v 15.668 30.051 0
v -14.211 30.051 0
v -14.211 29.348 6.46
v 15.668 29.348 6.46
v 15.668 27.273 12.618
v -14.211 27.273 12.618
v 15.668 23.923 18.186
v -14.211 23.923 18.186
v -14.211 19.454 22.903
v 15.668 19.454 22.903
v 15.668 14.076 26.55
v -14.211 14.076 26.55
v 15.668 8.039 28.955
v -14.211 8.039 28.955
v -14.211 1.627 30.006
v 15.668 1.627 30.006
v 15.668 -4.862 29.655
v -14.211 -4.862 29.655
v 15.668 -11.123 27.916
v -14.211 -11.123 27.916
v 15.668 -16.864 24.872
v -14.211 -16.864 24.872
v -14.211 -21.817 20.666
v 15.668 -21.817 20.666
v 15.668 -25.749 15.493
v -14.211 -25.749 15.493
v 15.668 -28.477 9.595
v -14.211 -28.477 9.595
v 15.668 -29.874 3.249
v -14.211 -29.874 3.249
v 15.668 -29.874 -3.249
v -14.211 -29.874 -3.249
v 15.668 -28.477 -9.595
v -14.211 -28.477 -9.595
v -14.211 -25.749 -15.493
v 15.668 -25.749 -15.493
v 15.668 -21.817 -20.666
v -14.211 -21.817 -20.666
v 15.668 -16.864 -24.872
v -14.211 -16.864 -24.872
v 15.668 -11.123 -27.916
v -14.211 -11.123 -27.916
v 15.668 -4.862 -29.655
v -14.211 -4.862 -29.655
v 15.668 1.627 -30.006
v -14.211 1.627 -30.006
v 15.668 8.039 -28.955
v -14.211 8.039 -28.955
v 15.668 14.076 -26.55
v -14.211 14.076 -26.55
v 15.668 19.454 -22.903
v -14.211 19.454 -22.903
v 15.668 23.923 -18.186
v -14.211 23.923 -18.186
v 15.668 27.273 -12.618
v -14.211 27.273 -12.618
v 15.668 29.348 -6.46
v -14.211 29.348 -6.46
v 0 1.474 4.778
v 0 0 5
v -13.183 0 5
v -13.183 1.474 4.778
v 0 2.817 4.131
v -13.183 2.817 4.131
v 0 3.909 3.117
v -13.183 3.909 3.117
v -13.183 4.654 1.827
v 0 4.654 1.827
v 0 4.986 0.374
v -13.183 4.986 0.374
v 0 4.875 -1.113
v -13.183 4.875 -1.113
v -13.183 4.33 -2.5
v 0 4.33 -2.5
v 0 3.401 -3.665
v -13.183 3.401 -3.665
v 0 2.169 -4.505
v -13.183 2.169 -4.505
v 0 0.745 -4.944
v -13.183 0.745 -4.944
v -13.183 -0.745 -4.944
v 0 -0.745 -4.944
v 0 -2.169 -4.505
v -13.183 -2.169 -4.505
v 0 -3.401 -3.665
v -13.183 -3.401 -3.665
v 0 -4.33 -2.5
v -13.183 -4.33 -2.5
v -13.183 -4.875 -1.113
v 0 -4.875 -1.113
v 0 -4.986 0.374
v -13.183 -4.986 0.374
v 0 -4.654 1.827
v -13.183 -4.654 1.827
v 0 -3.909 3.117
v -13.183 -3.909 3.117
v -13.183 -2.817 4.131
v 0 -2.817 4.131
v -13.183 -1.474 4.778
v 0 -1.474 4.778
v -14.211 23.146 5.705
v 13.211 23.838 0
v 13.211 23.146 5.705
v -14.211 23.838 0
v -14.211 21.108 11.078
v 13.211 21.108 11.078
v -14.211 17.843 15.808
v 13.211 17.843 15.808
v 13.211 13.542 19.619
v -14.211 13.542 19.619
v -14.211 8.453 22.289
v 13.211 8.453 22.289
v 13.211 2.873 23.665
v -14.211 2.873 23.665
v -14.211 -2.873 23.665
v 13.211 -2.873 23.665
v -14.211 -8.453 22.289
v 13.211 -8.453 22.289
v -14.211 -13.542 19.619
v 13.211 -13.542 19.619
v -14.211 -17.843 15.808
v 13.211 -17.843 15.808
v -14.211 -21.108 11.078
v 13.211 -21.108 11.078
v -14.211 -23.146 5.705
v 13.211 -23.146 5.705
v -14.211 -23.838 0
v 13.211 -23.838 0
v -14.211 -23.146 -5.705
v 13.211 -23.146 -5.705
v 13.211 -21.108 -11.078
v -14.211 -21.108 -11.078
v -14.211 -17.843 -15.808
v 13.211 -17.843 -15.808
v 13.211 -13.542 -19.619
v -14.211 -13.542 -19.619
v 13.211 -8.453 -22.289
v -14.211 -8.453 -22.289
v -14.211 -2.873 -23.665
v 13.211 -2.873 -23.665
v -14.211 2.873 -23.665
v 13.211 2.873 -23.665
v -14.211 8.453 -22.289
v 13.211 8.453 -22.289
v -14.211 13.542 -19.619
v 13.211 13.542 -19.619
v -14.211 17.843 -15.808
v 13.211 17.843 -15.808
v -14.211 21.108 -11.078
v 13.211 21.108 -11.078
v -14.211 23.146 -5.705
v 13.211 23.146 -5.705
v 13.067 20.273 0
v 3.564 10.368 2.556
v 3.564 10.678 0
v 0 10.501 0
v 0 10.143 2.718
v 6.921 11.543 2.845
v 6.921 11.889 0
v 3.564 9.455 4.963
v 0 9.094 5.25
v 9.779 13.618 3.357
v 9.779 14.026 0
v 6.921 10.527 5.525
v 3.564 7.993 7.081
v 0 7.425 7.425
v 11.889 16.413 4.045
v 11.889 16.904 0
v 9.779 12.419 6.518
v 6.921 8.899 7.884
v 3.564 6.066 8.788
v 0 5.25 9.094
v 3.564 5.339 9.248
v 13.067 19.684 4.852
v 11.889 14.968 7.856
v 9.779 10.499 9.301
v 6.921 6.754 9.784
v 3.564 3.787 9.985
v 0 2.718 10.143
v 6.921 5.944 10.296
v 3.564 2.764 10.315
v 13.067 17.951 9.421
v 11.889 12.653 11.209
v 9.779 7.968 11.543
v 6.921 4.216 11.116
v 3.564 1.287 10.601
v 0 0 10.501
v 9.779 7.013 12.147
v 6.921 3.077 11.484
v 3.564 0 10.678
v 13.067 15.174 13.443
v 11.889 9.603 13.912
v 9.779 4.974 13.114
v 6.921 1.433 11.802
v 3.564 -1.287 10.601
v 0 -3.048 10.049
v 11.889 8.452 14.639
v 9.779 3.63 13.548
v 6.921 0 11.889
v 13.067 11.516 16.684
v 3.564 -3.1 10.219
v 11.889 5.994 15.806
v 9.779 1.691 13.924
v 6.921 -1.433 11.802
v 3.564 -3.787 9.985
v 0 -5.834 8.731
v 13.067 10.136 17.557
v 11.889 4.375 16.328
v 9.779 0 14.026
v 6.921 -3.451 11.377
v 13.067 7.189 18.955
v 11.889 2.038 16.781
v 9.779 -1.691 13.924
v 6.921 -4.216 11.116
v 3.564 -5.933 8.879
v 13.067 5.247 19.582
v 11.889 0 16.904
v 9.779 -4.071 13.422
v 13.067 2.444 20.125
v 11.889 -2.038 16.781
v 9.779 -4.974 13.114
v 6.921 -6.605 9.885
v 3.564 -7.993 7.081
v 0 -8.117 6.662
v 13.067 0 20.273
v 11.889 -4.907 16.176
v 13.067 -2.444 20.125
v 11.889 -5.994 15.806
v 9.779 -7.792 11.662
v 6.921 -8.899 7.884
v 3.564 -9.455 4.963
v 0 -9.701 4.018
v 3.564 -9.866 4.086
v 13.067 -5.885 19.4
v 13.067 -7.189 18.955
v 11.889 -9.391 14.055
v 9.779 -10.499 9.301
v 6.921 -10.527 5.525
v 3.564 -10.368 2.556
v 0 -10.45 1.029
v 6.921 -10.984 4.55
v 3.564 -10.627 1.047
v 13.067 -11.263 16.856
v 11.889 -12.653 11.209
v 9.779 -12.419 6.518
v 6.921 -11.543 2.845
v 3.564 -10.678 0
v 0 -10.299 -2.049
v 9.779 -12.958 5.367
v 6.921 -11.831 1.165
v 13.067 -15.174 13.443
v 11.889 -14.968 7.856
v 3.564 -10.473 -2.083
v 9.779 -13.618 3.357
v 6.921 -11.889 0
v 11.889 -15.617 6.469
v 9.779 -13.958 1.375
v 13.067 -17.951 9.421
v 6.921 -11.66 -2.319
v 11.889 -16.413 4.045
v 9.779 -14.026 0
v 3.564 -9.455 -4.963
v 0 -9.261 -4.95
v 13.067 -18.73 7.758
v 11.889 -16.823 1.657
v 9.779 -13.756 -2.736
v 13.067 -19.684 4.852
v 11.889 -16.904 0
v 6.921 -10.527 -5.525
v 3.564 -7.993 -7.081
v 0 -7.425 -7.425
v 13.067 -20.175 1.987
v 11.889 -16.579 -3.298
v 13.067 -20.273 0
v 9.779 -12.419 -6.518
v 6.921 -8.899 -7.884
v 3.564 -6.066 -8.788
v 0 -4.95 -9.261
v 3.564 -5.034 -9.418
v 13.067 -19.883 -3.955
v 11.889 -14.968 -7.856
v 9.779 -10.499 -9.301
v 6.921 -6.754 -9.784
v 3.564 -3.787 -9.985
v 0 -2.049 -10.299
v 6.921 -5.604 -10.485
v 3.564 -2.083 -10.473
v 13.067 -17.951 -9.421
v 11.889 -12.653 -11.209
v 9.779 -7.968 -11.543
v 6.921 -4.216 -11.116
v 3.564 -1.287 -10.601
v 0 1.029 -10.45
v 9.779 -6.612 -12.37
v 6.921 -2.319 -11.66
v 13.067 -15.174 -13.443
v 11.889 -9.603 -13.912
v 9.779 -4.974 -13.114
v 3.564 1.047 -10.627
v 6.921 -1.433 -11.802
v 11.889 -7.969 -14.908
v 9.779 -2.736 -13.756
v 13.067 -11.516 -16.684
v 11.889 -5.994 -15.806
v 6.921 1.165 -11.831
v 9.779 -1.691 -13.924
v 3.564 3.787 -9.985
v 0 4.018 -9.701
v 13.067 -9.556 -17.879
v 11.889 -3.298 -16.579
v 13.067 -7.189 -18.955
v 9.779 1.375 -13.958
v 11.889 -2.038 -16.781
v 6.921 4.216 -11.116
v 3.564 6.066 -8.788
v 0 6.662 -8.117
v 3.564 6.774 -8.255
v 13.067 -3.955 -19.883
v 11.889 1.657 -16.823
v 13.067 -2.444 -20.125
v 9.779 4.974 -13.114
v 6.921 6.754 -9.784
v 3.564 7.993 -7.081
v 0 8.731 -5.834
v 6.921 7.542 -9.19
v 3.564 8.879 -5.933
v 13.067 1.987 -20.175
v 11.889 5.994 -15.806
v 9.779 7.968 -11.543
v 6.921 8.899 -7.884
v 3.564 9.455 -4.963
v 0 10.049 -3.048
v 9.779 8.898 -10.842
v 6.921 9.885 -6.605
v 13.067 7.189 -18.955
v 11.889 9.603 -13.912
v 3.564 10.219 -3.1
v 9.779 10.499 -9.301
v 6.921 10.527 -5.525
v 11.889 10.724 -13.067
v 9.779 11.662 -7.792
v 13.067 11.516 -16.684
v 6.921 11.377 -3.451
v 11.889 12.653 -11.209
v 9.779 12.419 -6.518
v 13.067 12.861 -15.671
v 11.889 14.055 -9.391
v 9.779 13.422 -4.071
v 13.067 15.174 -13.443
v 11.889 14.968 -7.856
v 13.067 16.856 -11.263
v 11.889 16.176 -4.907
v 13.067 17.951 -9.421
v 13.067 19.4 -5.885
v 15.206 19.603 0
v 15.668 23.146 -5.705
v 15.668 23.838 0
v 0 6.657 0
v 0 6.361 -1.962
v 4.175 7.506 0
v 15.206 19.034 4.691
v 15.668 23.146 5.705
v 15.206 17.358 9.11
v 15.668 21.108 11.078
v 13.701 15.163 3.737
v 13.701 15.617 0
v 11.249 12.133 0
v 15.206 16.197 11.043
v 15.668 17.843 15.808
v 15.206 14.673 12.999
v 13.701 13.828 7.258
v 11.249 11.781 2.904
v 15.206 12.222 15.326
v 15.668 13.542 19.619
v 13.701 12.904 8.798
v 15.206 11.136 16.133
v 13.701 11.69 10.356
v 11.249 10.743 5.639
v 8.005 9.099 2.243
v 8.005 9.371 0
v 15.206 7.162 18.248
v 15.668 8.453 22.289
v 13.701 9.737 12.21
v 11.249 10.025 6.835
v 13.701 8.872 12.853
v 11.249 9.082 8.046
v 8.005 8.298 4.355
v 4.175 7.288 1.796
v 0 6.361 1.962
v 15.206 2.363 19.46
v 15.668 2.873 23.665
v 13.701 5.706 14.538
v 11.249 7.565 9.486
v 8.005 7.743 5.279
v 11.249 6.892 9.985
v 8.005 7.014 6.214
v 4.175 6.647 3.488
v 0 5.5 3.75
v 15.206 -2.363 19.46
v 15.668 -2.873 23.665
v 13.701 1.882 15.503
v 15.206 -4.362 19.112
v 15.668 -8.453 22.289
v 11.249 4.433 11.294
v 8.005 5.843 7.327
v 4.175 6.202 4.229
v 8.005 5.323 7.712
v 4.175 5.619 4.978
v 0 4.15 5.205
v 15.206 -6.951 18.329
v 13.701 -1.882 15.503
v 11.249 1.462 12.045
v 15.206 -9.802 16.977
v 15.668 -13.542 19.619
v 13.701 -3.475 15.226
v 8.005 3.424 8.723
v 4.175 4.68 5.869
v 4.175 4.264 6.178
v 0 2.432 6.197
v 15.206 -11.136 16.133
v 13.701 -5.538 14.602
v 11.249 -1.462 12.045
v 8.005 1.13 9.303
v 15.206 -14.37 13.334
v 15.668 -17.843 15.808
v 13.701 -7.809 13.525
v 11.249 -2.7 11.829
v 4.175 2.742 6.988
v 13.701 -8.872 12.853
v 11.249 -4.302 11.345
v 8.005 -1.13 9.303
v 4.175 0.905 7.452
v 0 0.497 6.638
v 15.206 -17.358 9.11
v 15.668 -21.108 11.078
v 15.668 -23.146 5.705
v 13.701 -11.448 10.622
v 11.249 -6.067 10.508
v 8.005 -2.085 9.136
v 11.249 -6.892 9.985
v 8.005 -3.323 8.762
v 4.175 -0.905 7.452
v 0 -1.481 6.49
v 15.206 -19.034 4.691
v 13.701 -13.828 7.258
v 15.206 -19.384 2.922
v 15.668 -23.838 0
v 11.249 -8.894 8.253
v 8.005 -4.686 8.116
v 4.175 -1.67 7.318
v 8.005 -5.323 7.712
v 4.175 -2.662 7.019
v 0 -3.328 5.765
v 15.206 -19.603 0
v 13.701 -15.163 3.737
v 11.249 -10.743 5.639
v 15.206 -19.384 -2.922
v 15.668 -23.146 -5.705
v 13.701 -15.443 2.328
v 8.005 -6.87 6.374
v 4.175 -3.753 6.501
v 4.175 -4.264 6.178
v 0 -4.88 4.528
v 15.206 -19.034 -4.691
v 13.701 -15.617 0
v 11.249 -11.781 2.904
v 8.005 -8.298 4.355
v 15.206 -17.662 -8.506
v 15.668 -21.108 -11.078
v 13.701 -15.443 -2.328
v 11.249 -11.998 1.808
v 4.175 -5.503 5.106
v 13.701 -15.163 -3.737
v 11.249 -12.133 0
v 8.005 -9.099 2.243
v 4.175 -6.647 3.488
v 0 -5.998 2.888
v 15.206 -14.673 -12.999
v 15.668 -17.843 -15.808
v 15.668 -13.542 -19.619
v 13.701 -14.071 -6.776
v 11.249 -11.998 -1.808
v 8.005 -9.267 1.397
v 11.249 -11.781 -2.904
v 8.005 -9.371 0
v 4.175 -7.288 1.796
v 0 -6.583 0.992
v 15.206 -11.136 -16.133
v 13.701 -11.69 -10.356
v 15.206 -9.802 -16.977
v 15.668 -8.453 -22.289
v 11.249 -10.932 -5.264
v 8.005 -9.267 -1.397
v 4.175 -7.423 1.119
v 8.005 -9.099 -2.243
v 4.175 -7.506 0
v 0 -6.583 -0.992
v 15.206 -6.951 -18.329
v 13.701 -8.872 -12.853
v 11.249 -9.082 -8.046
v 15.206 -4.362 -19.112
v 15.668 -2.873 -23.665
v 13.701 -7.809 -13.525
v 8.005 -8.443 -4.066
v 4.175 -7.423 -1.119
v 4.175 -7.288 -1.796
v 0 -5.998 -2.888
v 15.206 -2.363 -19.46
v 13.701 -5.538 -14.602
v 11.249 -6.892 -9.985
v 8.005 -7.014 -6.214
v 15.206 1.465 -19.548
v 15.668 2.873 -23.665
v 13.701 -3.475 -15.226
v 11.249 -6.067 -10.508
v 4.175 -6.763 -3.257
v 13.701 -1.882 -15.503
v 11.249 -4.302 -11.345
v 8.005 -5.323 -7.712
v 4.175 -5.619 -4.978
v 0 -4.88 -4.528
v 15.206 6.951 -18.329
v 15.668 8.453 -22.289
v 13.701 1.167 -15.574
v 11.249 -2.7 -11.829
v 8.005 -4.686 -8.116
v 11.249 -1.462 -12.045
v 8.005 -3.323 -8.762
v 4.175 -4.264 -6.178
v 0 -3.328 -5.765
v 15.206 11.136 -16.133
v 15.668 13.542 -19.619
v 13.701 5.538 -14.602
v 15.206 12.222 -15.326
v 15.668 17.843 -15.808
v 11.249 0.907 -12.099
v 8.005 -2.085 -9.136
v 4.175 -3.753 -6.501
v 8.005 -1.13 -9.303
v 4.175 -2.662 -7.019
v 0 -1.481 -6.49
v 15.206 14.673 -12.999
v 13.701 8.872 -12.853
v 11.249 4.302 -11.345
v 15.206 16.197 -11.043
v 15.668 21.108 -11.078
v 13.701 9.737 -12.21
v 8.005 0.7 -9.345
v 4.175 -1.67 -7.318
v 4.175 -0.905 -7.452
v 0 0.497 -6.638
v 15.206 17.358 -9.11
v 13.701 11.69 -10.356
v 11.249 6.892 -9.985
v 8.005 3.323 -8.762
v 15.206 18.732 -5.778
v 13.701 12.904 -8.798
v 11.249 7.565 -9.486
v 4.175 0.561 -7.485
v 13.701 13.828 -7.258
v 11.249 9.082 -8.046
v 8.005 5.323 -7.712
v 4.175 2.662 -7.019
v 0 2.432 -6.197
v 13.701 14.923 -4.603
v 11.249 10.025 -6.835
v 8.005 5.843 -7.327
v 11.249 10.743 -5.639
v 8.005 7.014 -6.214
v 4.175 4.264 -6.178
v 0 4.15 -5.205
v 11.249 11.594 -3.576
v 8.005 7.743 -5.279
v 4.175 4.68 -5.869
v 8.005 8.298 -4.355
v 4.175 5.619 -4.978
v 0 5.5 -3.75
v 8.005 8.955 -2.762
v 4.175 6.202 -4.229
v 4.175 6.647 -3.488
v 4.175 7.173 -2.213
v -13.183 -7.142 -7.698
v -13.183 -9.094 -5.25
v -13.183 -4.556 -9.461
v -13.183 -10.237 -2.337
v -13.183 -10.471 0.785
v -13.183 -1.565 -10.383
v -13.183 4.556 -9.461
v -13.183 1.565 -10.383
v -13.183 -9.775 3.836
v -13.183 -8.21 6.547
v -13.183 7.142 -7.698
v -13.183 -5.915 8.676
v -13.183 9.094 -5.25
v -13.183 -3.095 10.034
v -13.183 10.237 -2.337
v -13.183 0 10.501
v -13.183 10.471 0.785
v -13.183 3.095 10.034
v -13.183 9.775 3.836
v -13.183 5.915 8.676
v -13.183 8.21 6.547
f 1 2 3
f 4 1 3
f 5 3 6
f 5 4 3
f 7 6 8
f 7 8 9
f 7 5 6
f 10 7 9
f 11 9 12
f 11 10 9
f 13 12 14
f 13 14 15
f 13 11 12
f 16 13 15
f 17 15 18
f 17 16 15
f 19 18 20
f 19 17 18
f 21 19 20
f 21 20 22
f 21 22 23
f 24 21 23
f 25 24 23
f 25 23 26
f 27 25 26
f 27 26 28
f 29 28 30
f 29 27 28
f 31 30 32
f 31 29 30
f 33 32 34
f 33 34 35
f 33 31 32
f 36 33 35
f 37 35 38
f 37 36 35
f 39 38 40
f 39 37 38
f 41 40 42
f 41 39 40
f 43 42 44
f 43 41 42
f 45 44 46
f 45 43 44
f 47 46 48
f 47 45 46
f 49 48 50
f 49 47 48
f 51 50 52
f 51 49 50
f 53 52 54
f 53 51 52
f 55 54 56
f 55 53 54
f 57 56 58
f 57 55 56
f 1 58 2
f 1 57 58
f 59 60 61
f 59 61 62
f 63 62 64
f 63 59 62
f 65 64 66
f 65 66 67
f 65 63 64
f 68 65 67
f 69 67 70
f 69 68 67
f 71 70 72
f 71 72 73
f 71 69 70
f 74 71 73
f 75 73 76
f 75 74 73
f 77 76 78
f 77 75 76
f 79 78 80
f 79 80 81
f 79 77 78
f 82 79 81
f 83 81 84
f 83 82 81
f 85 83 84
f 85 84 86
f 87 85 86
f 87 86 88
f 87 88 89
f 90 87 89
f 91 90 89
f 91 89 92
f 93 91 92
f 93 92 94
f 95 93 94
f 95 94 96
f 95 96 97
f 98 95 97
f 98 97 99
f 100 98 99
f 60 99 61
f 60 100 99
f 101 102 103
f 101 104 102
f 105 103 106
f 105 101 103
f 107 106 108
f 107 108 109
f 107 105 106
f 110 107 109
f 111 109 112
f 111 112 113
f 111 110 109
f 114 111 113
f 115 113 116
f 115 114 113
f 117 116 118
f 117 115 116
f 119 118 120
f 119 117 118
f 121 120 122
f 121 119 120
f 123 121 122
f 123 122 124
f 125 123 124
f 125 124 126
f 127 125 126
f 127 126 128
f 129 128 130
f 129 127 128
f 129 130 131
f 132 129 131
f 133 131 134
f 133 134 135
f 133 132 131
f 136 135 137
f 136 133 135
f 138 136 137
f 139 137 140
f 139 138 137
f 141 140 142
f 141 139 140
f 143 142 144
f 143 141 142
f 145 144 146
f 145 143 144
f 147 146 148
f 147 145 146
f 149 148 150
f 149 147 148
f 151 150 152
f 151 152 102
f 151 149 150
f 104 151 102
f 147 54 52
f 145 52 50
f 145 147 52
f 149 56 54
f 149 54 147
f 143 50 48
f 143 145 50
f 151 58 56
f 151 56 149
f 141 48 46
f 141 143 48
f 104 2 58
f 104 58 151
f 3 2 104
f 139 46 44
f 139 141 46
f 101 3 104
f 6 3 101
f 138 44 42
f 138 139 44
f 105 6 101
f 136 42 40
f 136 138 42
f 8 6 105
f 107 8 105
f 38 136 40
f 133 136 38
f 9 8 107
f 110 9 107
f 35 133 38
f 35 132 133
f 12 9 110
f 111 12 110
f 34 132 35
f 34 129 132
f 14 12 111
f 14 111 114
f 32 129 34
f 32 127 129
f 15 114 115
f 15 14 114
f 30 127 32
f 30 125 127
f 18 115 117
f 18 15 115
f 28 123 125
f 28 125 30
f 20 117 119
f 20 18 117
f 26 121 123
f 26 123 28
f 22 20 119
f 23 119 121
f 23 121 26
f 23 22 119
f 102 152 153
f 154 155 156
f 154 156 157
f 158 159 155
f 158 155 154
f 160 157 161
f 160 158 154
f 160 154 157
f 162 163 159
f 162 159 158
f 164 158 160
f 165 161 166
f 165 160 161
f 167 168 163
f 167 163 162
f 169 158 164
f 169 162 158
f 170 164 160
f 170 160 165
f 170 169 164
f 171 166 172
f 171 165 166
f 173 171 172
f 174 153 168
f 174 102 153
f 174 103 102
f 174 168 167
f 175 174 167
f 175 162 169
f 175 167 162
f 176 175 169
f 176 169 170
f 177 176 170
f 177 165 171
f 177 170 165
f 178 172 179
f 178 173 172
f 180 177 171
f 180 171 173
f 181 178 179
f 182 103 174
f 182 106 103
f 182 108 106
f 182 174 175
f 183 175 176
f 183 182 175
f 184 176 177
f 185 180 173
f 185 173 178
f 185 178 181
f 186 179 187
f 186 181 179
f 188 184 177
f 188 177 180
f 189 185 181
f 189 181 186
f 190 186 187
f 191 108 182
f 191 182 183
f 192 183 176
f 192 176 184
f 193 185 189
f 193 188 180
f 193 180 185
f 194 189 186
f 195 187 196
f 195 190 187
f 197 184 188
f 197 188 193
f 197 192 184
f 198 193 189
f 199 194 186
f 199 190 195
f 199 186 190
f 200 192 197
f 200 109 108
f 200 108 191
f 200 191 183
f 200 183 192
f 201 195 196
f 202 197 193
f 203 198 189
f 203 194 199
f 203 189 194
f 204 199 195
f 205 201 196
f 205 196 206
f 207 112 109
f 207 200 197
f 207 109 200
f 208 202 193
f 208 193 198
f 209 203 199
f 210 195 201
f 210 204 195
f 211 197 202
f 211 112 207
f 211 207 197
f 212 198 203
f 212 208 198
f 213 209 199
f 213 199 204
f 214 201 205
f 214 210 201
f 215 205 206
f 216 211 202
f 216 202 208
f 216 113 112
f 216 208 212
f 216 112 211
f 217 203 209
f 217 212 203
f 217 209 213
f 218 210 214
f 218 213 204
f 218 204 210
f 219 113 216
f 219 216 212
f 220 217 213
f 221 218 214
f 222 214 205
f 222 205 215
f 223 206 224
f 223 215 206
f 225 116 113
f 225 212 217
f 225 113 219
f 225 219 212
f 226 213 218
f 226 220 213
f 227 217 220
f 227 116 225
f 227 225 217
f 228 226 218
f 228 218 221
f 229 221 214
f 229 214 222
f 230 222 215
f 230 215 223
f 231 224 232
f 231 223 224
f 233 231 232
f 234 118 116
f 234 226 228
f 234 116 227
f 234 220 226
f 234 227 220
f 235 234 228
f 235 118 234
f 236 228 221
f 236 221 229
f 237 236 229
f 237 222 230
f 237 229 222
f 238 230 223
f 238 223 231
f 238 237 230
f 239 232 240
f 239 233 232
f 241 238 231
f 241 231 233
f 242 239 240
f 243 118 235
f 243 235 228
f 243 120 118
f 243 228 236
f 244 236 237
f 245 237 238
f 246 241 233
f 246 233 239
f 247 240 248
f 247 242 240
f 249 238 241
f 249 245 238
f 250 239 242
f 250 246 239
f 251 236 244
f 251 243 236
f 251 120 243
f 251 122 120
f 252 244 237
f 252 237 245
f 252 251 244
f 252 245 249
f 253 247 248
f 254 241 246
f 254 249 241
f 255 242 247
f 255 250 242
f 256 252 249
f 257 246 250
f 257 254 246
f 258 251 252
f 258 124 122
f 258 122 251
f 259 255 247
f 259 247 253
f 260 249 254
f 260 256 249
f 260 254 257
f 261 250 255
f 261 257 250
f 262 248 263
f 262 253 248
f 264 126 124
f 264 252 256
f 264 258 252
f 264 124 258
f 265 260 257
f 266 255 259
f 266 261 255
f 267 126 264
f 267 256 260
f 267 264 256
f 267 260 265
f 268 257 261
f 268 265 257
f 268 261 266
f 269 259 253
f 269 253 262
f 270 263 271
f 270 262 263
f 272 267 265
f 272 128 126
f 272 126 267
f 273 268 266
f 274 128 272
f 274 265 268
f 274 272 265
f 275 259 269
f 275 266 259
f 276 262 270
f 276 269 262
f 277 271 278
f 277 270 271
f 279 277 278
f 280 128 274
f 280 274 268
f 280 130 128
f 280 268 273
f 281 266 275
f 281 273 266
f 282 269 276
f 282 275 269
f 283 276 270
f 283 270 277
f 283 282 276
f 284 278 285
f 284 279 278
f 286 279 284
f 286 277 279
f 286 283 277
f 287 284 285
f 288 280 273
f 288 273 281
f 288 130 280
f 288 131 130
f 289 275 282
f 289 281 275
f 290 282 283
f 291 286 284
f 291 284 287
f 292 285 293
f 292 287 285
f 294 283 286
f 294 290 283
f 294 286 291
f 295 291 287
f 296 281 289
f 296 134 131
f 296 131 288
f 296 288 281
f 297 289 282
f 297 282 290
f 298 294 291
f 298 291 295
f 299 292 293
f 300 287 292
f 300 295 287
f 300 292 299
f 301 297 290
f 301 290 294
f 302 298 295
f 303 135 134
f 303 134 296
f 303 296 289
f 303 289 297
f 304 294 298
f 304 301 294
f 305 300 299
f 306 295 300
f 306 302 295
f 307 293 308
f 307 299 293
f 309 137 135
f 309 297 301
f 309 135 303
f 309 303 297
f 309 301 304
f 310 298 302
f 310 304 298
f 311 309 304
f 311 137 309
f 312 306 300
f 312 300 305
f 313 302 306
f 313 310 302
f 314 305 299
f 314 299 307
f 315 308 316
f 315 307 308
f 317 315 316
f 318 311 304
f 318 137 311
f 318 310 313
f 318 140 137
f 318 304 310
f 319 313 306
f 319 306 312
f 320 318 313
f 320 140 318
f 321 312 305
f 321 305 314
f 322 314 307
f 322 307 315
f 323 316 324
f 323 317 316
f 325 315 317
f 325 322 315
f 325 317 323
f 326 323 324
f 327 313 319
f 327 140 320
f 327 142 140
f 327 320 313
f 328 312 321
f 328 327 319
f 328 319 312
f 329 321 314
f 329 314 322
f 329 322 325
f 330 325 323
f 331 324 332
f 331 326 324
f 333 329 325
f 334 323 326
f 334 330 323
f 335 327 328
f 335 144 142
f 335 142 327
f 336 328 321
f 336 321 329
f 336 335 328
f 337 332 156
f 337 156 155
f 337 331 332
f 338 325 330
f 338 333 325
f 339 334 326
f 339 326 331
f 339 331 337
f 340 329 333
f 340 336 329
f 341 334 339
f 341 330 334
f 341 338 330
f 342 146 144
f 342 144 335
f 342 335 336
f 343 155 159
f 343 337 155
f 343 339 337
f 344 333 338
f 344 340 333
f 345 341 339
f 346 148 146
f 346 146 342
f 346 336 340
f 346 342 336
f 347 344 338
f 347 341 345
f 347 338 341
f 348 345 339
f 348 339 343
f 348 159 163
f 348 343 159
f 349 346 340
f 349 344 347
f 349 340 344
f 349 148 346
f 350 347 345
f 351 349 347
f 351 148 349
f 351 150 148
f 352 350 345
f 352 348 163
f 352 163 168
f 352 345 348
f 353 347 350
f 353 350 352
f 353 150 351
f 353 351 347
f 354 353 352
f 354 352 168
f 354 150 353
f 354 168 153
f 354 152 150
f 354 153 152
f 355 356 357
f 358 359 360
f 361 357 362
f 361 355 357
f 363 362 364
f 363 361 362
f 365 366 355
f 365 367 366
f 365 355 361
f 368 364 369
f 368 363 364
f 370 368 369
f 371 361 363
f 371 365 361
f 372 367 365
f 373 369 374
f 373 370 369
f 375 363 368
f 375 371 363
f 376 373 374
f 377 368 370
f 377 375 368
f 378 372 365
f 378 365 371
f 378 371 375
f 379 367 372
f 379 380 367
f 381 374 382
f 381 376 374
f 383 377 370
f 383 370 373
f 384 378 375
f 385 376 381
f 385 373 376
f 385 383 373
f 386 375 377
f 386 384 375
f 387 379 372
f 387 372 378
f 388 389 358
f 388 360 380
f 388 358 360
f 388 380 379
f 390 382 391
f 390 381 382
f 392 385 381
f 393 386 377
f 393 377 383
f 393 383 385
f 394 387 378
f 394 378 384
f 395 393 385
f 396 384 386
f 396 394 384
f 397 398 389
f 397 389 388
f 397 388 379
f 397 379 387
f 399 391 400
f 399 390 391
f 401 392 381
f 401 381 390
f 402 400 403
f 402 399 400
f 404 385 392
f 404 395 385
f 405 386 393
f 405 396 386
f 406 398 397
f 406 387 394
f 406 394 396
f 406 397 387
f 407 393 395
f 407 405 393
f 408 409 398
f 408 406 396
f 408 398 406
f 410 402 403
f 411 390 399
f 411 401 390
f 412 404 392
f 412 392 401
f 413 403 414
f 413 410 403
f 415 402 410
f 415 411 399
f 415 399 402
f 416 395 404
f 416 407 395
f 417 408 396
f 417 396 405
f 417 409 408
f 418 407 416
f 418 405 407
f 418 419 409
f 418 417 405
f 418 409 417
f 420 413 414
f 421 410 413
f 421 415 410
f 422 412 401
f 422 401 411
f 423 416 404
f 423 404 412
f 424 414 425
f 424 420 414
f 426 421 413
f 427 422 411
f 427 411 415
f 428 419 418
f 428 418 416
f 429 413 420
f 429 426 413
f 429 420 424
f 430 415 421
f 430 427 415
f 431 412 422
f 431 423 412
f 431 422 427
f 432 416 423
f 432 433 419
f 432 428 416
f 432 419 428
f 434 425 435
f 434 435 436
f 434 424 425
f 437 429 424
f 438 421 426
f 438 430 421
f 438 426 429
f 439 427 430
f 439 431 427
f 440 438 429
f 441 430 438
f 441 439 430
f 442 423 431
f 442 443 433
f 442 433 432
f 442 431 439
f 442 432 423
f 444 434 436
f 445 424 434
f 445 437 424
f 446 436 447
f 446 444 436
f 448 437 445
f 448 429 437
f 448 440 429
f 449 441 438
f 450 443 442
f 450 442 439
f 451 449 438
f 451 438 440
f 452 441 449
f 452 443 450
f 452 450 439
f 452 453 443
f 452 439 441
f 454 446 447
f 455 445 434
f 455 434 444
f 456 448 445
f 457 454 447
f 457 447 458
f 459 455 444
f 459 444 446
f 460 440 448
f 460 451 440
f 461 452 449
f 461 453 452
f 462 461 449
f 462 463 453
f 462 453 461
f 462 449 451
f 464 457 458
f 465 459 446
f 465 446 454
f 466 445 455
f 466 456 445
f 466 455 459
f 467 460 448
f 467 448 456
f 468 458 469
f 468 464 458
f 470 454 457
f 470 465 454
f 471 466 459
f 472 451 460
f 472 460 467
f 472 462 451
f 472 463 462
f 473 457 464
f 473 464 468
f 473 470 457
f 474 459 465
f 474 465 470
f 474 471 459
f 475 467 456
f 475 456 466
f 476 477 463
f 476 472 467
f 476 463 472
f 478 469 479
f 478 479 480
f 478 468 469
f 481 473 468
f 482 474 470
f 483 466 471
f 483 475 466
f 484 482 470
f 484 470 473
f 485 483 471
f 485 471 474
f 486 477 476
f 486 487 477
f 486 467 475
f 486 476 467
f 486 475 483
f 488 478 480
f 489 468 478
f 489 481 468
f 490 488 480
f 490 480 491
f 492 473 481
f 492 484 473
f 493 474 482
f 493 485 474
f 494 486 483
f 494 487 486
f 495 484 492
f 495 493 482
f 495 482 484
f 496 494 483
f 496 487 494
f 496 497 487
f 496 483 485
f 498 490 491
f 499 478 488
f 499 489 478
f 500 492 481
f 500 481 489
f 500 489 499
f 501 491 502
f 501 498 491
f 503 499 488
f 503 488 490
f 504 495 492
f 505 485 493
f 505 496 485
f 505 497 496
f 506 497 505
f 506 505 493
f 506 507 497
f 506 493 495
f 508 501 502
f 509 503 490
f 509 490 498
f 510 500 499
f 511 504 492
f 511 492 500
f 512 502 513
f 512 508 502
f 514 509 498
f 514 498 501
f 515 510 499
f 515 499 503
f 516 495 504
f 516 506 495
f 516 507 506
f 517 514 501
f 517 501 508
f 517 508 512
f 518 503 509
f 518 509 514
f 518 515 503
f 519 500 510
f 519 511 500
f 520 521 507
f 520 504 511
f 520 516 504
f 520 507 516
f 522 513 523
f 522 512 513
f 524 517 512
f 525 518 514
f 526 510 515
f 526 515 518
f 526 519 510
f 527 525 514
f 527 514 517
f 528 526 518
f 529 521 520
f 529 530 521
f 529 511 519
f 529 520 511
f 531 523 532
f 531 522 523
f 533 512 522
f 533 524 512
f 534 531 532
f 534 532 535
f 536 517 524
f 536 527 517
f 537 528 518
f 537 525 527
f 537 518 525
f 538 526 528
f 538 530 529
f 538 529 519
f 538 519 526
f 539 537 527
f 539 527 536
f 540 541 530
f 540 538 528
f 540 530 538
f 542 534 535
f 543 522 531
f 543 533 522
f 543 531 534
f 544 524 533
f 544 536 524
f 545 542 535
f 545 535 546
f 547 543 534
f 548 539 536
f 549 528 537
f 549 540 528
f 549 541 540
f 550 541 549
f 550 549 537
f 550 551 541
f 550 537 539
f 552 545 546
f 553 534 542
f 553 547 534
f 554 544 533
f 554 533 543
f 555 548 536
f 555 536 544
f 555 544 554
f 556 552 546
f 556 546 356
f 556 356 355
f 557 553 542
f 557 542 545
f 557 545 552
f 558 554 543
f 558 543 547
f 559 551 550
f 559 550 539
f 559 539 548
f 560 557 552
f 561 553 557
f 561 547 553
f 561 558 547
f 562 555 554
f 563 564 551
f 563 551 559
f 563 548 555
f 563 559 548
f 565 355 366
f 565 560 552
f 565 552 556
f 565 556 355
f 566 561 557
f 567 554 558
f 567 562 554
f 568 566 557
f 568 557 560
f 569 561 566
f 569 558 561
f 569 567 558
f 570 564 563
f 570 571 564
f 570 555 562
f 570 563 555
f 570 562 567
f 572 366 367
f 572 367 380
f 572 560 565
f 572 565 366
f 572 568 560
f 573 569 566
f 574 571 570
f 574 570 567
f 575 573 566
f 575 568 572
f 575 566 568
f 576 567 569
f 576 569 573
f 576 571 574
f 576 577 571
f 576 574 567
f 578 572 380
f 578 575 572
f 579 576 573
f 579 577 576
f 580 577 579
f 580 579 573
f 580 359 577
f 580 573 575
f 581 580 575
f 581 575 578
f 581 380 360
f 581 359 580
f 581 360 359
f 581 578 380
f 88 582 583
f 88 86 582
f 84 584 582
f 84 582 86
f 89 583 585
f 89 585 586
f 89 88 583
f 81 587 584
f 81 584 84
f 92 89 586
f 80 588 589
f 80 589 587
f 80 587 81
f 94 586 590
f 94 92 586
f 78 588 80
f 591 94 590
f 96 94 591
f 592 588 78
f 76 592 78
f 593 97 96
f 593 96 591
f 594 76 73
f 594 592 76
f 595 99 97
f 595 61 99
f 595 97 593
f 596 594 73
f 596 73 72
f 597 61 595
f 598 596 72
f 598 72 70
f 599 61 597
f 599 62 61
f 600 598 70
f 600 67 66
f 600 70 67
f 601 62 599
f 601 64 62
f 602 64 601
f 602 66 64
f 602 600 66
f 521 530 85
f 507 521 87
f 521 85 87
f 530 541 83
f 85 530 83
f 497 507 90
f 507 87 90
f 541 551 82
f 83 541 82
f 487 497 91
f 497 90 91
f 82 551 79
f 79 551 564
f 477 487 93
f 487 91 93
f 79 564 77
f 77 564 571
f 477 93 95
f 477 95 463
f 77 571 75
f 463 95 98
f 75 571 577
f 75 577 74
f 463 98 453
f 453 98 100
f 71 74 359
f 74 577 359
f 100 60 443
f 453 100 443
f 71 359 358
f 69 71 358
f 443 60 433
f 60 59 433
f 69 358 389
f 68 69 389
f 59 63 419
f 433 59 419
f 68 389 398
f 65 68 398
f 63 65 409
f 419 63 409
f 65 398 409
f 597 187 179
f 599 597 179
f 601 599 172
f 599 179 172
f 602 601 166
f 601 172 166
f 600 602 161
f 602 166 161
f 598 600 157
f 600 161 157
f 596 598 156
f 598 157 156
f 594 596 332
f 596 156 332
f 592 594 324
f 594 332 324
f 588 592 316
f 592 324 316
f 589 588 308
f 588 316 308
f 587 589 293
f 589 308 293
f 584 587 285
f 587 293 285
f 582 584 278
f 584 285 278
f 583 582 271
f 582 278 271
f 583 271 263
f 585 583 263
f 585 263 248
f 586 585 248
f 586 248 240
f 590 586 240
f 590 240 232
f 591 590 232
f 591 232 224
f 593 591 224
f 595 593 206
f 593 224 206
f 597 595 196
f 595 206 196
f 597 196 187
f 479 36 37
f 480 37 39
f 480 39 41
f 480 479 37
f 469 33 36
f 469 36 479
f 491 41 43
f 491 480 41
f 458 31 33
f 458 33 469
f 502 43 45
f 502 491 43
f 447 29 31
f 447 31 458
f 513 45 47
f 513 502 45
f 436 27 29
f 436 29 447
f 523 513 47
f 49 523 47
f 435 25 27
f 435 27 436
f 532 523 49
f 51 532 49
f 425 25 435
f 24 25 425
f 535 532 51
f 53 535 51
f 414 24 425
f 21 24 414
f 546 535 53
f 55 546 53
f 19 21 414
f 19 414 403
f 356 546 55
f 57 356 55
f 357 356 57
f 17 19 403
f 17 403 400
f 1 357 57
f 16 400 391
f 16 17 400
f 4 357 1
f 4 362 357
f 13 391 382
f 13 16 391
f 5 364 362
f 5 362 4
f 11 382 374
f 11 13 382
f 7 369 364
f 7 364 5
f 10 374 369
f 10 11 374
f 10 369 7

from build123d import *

# Parameters (mm, degrees)
SKETCH2_R           = 10.500659562
SKETCH2_R_2         = 5
BOSS_EXTRUDE2_DEPTH = 13.182787508


with BuildPart() as part:
    # Sketch1 → Revolve1 (revolve)
    with BuildSketch(Plane.XY):
        with BuildLine():
            Line((10.667721535, 30.050515382), (15.667721535, 30.050515382))
            Line((15.667721535, 30.050515382), (15.667721535, 23.838456429))
            ThreePointArc((15.667721535, 23.838456429), (11.249332557, 12.133123747), (0, 6.656857557))
            Line((0, 6.656857557), (0, 10.500659562))
            ThreePointArc((0, 10.500659562), (9.779386002, 14.025882573), (13.211146798, 23.838456429))
            Line((13.211146798, 23.838456429), (-14.211146798, 23.838456429))
            Line((-14.211146798, 23.838456429), (-14.211146798, 30.050515382))
            Line((-14.211146798, 30.050515382), (-9.211146798, 30.050515382))
            Line((-9.211146798, 30.050515382), (10.667721535, 30.050515382))
        make_face()
    revolve(axis=Axis((0, 0, 0), (1, 0, 0)))

    # Sketch2 → Boss-Extrude2 (add)
    with BuildSketch(Plane.ZY):
        Circle(SKETCH2_R)
        Circle(SKETCH2_R_2, mode=Mode.SUBTRACT)
    extrude(amount=BOSS_EXTRUDE2_DEPTH)


solid = part.part
